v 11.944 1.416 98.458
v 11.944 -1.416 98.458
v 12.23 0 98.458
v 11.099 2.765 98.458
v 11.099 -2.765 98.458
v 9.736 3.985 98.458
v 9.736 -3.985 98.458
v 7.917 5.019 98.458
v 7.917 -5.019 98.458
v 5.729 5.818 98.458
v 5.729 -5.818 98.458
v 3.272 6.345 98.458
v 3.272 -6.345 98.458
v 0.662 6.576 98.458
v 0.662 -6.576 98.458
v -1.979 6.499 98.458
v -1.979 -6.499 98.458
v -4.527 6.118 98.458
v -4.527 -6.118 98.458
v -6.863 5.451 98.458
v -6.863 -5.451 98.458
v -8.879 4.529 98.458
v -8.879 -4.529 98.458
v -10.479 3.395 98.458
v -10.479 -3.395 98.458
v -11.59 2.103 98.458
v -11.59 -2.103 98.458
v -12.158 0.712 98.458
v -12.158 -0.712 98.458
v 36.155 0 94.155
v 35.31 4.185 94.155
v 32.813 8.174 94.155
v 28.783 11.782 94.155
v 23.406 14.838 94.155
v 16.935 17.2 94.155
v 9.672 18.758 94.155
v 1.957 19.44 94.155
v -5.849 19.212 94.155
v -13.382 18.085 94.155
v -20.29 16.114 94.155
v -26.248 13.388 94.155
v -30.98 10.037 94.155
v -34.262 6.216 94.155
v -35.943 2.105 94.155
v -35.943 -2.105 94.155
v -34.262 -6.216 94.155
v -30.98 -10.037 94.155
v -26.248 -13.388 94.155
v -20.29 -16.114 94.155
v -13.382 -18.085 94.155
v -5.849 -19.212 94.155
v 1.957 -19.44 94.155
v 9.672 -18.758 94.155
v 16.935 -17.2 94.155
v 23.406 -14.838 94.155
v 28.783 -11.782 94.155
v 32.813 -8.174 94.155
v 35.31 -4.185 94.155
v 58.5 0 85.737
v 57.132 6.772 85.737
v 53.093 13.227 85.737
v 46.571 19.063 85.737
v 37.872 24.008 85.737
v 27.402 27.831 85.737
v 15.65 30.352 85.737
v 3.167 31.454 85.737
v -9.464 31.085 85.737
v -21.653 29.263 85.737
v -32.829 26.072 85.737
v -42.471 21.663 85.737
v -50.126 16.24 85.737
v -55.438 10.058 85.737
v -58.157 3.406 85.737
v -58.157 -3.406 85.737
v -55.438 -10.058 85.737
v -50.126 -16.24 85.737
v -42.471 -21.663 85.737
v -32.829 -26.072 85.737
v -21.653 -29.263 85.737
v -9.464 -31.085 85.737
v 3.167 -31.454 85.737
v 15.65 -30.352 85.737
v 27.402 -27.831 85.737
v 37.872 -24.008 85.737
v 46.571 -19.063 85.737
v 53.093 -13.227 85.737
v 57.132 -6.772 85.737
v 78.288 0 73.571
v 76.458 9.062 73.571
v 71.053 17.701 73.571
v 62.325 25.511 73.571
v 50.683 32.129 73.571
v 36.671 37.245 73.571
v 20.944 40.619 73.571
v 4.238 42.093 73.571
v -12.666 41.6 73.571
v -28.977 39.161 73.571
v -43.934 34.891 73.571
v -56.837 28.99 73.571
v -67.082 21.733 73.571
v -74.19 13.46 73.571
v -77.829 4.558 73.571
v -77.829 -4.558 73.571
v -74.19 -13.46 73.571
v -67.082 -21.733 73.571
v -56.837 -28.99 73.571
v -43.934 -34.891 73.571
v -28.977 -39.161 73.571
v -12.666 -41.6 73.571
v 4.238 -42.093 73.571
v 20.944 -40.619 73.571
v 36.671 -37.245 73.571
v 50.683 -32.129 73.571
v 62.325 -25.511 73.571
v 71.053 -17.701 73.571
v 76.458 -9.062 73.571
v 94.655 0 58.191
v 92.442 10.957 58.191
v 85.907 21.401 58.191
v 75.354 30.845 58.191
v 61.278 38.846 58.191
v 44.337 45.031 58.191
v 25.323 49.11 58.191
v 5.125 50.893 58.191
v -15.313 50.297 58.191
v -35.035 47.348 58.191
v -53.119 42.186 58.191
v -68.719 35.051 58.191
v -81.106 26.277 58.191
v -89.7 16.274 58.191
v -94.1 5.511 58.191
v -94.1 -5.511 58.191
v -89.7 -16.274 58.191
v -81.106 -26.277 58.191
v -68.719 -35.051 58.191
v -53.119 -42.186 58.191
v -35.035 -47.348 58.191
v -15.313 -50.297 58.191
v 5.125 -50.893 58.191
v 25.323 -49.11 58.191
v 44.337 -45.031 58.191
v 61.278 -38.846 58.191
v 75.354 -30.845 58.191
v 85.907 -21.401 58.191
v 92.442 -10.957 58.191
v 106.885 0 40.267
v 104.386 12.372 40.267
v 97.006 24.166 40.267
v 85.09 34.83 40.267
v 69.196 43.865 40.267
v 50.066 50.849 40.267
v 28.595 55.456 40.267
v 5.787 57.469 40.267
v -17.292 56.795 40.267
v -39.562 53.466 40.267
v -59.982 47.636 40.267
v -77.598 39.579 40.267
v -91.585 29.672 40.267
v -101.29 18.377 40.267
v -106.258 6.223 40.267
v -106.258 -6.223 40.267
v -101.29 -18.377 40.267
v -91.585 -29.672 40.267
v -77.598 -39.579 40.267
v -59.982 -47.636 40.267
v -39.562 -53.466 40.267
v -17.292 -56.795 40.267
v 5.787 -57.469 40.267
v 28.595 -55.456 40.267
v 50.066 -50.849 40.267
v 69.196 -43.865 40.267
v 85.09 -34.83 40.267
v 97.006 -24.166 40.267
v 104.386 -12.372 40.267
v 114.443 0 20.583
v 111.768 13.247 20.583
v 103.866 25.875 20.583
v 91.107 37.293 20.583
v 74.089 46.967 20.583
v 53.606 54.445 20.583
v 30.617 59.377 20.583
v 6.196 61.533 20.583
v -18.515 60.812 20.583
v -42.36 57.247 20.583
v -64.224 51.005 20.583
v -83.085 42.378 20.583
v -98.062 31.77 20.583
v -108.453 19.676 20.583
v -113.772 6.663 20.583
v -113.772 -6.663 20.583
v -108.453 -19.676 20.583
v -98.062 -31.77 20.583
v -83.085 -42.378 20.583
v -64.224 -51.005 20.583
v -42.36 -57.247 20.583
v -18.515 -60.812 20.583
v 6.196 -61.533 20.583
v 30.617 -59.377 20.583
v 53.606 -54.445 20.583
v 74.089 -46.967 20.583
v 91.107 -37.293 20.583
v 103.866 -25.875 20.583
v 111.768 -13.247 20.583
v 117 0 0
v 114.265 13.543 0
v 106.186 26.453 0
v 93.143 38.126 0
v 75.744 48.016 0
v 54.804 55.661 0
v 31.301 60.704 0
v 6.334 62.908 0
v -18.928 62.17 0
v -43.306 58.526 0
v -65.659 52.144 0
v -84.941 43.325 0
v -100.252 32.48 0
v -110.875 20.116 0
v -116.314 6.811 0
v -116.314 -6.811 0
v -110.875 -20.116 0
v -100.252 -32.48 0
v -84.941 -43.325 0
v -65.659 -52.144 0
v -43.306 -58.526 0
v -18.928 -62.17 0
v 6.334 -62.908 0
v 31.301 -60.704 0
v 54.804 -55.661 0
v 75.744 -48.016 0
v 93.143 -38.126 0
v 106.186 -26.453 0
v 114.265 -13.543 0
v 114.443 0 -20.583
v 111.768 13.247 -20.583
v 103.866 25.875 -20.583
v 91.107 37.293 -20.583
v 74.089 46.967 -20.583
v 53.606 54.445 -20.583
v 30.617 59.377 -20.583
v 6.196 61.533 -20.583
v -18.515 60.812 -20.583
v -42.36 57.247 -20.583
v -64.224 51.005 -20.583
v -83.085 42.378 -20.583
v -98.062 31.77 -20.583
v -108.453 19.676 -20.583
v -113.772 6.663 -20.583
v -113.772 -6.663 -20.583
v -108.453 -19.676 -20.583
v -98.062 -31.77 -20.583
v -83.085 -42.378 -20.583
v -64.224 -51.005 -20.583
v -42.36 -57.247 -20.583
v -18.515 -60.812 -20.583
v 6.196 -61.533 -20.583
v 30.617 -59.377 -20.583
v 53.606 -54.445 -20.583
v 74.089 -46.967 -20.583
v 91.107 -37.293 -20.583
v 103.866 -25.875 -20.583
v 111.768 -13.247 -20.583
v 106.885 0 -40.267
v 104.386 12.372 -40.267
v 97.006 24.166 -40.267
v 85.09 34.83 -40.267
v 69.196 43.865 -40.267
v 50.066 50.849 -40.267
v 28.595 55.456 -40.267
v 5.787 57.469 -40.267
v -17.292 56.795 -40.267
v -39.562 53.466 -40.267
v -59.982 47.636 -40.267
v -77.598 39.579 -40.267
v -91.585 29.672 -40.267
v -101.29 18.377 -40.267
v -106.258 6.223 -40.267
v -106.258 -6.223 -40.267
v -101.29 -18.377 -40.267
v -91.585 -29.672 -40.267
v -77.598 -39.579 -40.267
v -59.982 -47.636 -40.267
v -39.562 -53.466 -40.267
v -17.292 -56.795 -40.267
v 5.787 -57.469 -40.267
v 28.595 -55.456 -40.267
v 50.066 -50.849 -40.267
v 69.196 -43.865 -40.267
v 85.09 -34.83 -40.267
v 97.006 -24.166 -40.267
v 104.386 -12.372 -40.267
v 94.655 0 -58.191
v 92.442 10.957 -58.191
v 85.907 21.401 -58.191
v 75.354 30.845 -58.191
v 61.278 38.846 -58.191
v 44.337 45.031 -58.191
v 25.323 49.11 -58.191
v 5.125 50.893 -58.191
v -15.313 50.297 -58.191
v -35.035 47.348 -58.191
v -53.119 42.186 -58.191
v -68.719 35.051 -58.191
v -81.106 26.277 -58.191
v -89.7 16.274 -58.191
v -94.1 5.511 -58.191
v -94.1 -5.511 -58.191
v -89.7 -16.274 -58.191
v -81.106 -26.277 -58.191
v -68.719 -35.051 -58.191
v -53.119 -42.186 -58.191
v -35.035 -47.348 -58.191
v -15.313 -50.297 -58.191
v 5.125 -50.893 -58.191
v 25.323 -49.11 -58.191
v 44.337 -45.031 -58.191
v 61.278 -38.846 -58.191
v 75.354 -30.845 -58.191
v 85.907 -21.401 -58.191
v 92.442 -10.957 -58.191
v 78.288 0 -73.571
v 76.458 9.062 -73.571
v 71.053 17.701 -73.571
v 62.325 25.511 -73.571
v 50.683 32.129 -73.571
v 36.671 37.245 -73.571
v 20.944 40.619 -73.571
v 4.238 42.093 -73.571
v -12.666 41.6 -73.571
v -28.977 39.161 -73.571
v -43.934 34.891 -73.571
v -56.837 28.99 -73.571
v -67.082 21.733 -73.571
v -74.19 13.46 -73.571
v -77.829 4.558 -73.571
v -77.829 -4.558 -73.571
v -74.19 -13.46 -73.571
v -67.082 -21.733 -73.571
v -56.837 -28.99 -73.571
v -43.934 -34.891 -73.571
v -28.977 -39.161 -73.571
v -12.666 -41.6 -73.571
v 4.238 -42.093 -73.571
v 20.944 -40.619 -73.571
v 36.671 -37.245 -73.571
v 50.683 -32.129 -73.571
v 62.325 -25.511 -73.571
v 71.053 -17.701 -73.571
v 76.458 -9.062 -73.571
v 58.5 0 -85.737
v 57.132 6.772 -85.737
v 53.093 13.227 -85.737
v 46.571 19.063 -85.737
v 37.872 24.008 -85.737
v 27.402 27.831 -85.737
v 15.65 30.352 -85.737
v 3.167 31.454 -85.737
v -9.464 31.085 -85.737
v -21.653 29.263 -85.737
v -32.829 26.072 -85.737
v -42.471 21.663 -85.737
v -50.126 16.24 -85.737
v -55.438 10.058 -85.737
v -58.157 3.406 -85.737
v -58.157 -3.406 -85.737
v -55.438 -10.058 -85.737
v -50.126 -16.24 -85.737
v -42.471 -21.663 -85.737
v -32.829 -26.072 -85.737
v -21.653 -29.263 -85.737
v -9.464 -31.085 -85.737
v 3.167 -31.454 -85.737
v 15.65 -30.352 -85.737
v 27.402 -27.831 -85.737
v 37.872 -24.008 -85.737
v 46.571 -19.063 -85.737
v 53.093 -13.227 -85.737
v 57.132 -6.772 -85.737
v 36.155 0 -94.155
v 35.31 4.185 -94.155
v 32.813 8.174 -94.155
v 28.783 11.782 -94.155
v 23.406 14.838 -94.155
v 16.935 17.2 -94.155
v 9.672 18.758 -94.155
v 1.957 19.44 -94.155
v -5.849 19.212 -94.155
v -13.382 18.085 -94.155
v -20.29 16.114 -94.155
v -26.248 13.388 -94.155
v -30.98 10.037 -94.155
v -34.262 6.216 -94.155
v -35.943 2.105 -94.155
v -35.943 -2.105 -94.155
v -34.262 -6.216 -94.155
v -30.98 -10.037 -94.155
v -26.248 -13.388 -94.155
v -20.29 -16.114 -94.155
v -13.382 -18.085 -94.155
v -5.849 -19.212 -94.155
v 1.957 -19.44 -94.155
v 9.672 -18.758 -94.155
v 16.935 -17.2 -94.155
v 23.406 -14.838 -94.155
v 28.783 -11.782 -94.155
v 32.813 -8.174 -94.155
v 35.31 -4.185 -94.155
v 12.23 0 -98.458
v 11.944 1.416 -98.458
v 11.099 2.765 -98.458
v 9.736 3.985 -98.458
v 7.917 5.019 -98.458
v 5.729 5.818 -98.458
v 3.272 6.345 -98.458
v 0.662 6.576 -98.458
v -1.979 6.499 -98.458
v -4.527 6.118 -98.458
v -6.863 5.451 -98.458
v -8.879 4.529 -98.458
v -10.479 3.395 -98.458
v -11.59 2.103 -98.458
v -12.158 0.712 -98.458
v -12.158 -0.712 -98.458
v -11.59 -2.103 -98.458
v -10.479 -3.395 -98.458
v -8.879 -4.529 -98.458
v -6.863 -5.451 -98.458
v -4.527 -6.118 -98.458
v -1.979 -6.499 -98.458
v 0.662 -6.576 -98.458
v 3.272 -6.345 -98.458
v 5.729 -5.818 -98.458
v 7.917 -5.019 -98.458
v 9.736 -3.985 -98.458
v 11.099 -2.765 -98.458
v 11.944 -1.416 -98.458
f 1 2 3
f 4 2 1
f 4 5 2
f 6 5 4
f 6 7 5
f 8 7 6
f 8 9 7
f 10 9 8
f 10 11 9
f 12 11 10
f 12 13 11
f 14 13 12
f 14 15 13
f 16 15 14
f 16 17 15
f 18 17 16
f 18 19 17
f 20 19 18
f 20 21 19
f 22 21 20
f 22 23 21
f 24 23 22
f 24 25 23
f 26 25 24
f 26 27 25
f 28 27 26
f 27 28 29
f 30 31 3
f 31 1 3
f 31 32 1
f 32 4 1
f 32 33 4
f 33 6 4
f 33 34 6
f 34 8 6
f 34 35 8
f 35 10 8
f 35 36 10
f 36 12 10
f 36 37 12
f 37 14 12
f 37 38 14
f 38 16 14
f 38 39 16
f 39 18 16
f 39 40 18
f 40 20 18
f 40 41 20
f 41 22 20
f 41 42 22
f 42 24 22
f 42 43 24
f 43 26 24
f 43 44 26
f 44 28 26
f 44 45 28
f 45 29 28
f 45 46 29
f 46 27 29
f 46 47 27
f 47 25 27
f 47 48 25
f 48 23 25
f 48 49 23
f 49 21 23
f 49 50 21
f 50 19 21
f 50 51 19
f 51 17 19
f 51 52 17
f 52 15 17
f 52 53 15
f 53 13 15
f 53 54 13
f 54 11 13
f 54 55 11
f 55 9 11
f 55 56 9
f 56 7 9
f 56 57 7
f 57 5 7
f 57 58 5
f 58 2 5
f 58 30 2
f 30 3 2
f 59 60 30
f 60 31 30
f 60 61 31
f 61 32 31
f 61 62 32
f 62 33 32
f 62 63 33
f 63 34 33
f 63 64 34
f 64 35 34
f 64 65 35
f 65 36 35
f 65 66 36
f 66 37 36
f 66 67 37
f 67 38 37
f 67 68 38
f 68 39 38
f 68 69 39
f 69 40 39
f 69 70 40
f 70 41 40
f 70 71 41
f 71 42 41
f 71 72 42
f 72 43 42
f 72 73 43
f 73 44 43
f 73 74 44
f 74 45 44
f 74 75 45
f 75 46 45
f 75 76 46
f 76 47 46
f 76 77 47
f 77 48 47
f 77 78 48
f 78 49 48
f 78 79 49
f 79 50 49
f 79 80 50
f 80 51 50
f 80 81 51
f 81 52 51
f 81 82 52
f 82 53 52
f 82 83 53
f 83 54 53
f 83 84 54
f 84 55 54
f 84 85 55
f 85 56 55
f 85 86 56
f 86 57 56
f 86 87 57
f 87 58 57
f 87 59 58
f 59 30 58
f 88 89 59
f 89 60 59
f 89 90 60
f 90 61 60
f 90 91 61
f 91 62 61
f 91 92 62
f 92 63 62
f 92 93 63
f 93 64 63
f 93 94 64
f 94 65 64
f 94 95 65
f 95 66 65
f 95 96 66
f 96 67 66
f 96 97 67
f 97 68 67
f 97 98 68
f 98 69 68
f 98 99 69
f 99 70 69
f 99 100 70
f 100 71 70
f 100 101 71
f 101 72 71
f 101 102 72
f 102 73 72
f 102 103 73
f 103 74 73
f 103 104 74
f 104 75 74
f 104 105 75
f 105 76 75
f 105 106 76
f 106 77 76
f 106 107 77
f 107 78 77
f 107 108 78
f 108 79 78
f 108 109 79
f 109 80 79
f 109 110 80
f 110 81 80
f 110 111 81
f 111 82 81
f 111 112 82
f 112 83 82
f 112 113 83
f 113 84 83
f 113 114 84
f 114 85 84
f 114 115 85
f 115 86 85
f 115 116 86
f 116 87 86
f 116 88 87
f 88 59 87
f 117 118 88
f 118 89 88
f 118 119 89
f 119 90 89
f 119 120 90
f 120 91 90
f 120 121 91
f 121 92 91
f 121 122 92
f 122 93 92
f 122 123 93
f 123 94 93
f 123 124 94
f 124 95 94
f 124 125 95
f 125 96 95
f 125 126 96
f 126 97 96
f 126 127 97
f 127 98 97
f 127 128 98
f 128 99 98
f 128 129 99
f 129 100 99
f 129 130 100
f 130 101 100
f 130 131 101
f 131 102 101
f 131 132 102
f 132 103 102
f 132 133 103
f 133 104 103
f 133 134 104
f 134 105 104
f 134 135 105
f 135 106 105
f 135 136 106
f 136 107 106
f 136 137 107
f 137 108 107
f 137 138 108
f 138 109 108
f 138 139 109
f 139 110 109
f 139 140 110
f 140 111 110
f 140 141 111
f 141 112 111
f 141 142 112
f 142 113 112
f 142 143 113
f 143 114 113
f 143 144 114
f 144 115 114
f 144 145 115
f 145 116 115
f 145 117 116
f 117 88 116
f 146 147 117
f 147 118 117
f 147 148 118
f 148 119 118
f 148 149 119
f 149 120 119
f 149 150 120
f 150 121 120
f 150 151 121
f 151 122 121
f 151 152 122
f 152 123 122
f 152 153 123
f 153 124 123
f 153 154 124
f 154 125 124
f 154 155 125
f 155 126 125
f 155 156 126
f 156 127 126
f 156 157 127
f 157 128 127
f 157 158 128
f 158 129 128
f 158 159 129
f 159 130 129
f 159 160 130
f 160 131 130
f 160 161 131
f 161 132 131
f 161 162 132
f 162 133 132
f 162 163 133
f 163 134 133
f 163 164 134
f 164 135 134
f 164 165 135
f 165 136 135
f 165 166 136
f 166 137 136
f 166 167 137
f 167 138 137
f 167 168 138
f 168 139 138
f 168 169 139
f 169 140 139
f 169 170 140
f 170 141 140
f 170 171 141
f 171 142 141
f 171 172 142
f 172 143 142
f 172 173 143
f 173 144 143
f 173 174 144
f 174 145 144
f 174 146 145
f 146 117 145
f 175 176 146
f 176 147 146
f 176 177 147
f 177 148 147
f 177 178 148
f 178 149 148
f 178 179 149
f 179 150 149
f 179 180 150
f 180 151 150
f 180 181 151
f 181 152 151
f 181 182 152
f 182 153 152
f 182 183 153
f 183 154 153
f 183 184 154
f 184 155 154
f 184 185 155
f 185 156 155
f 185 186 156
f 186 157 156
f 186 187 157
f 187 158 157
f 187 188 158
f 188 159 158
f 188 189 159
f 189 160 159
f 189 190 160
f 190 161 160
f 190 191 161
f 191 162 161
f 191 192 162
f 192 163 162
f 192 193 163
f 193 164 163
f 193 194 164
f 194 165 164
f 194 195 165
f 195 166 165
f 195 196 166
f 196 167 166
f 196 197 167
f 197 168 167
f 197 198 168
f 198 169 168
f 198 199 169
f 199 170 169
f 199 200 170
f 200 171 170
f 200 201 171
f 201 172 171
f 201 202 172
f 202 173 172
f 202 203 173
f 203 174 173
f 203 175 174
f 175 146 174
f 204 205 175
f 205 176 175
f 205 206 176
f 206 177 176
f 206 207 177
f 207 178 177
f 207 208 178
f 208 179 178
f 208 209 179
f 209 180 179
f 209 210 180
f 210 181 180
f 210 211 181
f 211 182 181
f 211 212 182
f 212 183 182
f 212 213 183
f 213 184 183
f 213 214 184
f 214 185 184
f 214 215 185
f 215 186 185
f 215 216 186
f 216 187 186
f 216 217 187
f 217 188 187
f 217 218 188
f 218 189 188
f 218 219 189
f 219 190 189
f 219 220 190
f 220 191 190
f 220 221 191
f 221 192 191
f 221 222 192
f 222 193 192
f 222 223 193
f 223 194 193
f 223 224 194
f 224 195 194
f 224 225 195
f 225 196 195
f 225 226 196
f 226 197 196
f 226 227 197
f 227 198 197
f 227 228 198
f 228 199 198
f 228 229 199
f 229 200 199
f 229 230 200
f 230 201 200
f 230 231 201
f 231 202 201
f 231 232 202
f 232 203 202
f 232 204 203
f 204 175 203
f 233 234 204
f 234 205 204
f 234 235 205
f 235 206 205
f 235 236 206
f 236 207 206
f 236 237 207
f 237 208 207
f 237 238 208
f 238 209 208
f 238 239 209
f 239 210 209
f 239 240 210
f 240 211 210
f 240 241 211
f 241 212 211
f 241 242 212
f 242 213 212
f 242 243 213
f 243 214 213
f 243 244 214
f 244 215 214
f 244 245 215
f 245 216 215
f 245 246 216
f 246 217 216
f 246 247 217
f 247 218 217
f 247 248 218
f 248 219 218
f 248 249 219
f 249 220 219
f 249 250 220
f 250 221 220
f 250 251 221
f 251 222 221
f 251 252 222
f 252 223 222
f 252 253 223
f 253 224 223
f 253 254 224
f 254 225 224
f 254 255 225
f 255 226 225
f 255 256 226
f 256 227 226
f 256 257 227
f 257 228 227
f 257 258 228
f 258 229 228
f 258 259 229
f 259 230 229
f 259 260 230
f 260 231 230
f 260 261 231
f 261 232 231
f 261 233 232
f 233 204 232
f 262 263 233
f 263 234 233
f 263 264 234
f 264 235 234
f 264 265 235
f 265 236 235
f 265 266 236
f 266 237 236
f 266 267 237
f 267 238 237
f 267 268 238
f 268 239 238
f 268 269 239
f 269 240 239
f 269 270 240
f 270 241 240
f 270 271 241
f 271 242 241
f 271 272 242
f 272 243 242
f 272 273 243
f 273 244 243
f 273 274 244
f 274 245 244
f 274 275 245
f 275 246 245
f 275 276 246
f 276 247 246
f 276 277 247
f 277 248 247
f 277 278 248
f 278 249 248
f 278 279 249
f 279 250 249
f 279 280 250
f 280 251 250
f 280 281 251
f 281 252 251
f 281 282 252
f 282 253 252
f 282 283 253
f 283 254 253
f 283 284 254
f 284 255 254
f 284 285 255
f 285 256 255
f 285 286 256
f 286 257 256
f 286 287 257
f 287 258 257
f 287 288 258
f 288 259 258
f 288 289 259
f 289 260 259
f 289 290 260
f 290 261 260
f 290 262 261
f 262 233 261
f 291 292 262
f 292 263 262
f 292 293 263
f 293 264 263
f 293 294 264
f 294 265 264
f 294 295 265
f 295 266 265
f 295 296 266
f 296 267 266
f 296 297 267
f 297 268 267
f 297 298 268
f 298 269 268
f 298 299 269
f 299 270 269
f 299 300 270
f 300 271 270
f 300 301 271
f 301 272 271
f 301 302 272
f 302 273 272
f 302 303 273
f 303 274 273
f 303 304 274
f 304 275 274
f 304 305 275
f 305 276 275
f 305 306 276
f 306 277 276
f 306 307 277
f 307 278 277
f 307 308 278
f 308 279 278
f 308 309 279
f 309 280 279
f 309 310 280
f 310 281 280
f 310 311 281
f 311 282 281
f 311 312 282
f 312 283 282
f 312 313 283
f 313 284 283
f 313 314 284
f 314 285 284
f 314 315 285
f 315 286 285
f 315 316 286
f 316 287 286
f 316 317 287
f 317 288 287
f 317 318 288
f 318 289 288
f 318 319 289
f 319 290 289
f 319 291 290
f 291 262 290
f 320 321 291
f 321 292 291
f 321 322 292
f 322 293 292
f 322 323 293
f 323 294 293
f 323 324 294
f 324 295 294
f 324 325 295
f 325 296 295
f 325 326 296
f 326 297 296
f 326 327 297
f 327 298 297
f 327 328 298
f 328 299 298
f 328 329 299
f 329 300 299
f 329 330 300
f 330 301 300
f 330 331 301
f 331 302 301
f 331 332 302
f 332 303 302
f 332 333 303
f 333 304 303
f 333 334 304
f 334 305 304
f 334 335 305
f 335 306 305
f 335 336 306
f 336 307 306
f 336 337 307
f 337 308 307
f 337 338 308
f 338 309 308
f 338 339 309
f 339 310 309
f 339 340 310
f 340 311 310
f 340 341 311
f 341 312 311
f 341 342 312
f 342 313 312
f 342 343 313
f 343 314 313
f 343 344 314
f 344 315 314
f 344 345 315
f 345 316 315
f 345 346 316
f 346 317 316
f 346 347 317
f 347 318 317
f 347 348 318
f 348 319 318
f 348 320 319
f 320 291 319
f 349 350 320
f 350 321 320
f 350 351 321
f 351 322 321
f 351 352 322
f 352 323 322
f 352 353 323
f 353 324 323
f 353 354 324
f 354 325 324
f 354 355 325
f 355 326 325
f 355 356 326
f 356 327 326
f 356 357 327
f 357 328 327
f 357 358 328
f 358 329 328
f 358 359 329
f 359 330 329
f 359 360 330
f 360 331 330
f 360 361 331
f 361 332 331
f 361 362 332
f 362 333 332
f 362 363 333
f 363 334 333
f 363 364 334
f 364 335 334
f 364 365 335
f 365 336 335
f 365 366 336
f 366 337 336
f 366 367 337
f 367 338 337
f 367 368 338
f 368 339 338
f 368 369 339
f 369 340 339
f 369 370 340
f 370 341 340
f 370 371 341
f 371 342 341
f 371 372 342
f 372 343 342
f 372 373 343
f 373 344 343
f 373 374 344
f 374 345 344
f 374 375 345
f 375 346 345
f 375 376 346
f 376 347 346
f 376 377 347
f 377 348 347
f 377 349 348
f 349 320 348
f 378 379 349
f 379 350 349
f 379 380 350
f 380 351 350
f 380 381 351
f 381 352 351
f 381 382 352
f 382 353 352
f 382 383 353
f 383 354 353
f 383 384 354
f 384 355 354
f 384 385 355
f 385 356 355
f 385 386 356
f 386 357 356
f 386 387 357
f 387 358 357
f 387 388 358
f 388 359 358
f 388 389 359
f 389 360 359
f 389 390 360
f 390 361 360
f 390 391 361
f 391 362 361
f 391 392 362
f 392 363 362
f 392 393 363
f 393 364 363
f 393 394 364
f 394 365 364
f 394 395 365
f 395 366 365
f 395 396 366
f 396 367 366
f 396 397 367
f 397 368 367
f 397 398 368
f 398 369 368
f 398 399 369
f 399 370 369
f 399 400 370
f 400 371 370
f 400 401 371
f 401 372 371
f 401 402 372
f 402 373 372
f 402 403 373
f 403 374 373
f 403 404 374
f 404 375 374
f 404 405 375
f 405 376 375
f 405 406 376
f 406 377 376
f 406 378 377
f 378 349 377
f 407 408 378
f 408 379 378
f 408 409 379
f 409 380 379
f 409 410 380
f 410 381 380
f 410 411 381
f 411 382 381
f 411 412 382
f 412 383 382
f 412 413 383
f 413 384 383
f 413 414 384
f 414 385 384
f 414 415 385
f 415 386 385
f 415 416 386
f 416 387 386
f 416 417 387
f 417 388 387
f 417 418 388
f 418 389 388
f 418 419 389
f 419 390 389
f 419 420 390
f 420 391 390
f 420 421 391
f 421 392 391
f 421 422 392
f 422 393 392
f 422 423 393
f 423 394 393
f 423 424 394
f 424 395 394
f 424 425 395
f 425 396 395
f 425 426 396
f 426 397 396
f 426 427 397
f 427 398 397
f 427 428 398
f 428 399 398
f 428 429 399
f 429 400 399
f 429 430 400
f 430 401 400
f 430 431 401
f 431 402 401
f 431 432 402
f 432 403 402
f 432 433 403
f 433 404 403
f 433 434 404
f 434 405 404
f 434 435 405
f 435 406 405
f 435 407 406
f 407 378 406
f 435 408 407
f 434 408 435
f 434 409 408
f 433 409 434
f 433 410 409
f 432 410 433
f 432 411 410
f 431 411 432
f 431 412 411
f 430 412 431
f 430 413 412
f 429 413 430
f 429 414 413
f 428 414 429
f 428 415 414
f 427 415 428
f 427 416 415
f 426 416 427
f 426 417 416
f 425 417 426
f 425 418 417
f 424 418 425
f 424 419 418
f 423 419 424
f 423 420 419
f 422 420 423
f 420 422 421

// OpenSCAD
// Generated by SolidPython 1.0.1 on 2020-07-29 00:46:50


scale(v = [13, 7, 11]) {
	sphere(r = 9);
}
/***********************************************
*********      SolidPython code:      **********
************************************************
 
# import packages: SolidPython
from solid import *
from solid.utils import *
from itertools import chain, combinations, permutations


class Resize:

    def __init__(self, scad_file):
        self.scad_file = scad_file
        #self.scad_file = import_scad(scad_file)
        # cone/cylinder param:
        self.r1 = 0
        self.r2 = 0
        self.h = 0
        # rectangular prism param:
        self.w = 0
        self.l = 0
        # ellipse param:
        self.r = 0

    # import OpenScad code (file name corresponds to shape)


    # classify shape + parameters
    def assign(self, param1, param2, param3):
        if self.scad_file == 'cone.scad':
            self.r1 = param1
            self.r2 = param2
            self.h = param3
        elif self.scad_file == 'cylinder.scad':
            self.r1 = param1
            self.r2 = param2
            self.h = param3
        elif self.scad_file == 'rectangularPrism.scad':
            self.h = param1
            self.l = param2
            self.w = param3
        else:
            self.r = param1
            self.h = param2

    # resize parameters
    def iterate(self):
        x = range(3, 20, 2)
        i = 1
        if self.scad_file == 'cone.scad':
            tempList = list(permutations(x, 2))
            for temp in tempList:
                param1 = temp[0]
                param2 = temp[1]
                filepath = 'produced_scad_files/' + 'cone' + str(param1) + '_' + str(param2) + '_' + '.scad'
                scad_render_to_file(cylinder(h=param1, r1=param2, r2=0), filepath)

        elif self.scad_file == 'cylinder.scad':
            tempList = list(permutations(x, 3))
            for temp in tempList:
                param1 = temp[0]
                param2 = temp[1]
                filepath = 'produced_scad_files/' + 'cylinder' + str(param1) + '_' + str(param2) + '_' + '.scad'
                scad_render_to_file(cylinder(h=param1, r1=param2, r2=param2), filepath)

        elif self.scad_file == 'rectangularPrism.scad':
            tempList = list(permutations(x, 3))
            for temp in tempList:
                param1 = temp[0]
                param2 = temp[1]
                param3 = temp[2]
                filepath = 'produced_scad_files/' + 'rectangularPrism' + str(param1) + '_' + str(param2) + '_' + str(
                    param3) + '.scad'
                scad_render_to_file(cube(size=(param1, param2, param3)), filepath)

        elif self.scad_file == 'ellipse.scad':
            tempList = list(permutations(x, 4))
            for temp in tempList:
                param1 = temp[0]
                param2 = temp[1]
                param3 = temp[2]
                param4 = temp[3]
                filepath = 'produced_scad_files/' + 'ellipse' + str(param1) + '_' + str(param2) + '_' + str(param3) + '_' + str(param4) + '.scad'
                scad_render_to_file(scale([param1, param2, param3])(sphere(r=param4)), filepath)

    def render_to_scadfile(self):
        scad_render_to_file(scad, 'example.scad') 
 
************************************************/
